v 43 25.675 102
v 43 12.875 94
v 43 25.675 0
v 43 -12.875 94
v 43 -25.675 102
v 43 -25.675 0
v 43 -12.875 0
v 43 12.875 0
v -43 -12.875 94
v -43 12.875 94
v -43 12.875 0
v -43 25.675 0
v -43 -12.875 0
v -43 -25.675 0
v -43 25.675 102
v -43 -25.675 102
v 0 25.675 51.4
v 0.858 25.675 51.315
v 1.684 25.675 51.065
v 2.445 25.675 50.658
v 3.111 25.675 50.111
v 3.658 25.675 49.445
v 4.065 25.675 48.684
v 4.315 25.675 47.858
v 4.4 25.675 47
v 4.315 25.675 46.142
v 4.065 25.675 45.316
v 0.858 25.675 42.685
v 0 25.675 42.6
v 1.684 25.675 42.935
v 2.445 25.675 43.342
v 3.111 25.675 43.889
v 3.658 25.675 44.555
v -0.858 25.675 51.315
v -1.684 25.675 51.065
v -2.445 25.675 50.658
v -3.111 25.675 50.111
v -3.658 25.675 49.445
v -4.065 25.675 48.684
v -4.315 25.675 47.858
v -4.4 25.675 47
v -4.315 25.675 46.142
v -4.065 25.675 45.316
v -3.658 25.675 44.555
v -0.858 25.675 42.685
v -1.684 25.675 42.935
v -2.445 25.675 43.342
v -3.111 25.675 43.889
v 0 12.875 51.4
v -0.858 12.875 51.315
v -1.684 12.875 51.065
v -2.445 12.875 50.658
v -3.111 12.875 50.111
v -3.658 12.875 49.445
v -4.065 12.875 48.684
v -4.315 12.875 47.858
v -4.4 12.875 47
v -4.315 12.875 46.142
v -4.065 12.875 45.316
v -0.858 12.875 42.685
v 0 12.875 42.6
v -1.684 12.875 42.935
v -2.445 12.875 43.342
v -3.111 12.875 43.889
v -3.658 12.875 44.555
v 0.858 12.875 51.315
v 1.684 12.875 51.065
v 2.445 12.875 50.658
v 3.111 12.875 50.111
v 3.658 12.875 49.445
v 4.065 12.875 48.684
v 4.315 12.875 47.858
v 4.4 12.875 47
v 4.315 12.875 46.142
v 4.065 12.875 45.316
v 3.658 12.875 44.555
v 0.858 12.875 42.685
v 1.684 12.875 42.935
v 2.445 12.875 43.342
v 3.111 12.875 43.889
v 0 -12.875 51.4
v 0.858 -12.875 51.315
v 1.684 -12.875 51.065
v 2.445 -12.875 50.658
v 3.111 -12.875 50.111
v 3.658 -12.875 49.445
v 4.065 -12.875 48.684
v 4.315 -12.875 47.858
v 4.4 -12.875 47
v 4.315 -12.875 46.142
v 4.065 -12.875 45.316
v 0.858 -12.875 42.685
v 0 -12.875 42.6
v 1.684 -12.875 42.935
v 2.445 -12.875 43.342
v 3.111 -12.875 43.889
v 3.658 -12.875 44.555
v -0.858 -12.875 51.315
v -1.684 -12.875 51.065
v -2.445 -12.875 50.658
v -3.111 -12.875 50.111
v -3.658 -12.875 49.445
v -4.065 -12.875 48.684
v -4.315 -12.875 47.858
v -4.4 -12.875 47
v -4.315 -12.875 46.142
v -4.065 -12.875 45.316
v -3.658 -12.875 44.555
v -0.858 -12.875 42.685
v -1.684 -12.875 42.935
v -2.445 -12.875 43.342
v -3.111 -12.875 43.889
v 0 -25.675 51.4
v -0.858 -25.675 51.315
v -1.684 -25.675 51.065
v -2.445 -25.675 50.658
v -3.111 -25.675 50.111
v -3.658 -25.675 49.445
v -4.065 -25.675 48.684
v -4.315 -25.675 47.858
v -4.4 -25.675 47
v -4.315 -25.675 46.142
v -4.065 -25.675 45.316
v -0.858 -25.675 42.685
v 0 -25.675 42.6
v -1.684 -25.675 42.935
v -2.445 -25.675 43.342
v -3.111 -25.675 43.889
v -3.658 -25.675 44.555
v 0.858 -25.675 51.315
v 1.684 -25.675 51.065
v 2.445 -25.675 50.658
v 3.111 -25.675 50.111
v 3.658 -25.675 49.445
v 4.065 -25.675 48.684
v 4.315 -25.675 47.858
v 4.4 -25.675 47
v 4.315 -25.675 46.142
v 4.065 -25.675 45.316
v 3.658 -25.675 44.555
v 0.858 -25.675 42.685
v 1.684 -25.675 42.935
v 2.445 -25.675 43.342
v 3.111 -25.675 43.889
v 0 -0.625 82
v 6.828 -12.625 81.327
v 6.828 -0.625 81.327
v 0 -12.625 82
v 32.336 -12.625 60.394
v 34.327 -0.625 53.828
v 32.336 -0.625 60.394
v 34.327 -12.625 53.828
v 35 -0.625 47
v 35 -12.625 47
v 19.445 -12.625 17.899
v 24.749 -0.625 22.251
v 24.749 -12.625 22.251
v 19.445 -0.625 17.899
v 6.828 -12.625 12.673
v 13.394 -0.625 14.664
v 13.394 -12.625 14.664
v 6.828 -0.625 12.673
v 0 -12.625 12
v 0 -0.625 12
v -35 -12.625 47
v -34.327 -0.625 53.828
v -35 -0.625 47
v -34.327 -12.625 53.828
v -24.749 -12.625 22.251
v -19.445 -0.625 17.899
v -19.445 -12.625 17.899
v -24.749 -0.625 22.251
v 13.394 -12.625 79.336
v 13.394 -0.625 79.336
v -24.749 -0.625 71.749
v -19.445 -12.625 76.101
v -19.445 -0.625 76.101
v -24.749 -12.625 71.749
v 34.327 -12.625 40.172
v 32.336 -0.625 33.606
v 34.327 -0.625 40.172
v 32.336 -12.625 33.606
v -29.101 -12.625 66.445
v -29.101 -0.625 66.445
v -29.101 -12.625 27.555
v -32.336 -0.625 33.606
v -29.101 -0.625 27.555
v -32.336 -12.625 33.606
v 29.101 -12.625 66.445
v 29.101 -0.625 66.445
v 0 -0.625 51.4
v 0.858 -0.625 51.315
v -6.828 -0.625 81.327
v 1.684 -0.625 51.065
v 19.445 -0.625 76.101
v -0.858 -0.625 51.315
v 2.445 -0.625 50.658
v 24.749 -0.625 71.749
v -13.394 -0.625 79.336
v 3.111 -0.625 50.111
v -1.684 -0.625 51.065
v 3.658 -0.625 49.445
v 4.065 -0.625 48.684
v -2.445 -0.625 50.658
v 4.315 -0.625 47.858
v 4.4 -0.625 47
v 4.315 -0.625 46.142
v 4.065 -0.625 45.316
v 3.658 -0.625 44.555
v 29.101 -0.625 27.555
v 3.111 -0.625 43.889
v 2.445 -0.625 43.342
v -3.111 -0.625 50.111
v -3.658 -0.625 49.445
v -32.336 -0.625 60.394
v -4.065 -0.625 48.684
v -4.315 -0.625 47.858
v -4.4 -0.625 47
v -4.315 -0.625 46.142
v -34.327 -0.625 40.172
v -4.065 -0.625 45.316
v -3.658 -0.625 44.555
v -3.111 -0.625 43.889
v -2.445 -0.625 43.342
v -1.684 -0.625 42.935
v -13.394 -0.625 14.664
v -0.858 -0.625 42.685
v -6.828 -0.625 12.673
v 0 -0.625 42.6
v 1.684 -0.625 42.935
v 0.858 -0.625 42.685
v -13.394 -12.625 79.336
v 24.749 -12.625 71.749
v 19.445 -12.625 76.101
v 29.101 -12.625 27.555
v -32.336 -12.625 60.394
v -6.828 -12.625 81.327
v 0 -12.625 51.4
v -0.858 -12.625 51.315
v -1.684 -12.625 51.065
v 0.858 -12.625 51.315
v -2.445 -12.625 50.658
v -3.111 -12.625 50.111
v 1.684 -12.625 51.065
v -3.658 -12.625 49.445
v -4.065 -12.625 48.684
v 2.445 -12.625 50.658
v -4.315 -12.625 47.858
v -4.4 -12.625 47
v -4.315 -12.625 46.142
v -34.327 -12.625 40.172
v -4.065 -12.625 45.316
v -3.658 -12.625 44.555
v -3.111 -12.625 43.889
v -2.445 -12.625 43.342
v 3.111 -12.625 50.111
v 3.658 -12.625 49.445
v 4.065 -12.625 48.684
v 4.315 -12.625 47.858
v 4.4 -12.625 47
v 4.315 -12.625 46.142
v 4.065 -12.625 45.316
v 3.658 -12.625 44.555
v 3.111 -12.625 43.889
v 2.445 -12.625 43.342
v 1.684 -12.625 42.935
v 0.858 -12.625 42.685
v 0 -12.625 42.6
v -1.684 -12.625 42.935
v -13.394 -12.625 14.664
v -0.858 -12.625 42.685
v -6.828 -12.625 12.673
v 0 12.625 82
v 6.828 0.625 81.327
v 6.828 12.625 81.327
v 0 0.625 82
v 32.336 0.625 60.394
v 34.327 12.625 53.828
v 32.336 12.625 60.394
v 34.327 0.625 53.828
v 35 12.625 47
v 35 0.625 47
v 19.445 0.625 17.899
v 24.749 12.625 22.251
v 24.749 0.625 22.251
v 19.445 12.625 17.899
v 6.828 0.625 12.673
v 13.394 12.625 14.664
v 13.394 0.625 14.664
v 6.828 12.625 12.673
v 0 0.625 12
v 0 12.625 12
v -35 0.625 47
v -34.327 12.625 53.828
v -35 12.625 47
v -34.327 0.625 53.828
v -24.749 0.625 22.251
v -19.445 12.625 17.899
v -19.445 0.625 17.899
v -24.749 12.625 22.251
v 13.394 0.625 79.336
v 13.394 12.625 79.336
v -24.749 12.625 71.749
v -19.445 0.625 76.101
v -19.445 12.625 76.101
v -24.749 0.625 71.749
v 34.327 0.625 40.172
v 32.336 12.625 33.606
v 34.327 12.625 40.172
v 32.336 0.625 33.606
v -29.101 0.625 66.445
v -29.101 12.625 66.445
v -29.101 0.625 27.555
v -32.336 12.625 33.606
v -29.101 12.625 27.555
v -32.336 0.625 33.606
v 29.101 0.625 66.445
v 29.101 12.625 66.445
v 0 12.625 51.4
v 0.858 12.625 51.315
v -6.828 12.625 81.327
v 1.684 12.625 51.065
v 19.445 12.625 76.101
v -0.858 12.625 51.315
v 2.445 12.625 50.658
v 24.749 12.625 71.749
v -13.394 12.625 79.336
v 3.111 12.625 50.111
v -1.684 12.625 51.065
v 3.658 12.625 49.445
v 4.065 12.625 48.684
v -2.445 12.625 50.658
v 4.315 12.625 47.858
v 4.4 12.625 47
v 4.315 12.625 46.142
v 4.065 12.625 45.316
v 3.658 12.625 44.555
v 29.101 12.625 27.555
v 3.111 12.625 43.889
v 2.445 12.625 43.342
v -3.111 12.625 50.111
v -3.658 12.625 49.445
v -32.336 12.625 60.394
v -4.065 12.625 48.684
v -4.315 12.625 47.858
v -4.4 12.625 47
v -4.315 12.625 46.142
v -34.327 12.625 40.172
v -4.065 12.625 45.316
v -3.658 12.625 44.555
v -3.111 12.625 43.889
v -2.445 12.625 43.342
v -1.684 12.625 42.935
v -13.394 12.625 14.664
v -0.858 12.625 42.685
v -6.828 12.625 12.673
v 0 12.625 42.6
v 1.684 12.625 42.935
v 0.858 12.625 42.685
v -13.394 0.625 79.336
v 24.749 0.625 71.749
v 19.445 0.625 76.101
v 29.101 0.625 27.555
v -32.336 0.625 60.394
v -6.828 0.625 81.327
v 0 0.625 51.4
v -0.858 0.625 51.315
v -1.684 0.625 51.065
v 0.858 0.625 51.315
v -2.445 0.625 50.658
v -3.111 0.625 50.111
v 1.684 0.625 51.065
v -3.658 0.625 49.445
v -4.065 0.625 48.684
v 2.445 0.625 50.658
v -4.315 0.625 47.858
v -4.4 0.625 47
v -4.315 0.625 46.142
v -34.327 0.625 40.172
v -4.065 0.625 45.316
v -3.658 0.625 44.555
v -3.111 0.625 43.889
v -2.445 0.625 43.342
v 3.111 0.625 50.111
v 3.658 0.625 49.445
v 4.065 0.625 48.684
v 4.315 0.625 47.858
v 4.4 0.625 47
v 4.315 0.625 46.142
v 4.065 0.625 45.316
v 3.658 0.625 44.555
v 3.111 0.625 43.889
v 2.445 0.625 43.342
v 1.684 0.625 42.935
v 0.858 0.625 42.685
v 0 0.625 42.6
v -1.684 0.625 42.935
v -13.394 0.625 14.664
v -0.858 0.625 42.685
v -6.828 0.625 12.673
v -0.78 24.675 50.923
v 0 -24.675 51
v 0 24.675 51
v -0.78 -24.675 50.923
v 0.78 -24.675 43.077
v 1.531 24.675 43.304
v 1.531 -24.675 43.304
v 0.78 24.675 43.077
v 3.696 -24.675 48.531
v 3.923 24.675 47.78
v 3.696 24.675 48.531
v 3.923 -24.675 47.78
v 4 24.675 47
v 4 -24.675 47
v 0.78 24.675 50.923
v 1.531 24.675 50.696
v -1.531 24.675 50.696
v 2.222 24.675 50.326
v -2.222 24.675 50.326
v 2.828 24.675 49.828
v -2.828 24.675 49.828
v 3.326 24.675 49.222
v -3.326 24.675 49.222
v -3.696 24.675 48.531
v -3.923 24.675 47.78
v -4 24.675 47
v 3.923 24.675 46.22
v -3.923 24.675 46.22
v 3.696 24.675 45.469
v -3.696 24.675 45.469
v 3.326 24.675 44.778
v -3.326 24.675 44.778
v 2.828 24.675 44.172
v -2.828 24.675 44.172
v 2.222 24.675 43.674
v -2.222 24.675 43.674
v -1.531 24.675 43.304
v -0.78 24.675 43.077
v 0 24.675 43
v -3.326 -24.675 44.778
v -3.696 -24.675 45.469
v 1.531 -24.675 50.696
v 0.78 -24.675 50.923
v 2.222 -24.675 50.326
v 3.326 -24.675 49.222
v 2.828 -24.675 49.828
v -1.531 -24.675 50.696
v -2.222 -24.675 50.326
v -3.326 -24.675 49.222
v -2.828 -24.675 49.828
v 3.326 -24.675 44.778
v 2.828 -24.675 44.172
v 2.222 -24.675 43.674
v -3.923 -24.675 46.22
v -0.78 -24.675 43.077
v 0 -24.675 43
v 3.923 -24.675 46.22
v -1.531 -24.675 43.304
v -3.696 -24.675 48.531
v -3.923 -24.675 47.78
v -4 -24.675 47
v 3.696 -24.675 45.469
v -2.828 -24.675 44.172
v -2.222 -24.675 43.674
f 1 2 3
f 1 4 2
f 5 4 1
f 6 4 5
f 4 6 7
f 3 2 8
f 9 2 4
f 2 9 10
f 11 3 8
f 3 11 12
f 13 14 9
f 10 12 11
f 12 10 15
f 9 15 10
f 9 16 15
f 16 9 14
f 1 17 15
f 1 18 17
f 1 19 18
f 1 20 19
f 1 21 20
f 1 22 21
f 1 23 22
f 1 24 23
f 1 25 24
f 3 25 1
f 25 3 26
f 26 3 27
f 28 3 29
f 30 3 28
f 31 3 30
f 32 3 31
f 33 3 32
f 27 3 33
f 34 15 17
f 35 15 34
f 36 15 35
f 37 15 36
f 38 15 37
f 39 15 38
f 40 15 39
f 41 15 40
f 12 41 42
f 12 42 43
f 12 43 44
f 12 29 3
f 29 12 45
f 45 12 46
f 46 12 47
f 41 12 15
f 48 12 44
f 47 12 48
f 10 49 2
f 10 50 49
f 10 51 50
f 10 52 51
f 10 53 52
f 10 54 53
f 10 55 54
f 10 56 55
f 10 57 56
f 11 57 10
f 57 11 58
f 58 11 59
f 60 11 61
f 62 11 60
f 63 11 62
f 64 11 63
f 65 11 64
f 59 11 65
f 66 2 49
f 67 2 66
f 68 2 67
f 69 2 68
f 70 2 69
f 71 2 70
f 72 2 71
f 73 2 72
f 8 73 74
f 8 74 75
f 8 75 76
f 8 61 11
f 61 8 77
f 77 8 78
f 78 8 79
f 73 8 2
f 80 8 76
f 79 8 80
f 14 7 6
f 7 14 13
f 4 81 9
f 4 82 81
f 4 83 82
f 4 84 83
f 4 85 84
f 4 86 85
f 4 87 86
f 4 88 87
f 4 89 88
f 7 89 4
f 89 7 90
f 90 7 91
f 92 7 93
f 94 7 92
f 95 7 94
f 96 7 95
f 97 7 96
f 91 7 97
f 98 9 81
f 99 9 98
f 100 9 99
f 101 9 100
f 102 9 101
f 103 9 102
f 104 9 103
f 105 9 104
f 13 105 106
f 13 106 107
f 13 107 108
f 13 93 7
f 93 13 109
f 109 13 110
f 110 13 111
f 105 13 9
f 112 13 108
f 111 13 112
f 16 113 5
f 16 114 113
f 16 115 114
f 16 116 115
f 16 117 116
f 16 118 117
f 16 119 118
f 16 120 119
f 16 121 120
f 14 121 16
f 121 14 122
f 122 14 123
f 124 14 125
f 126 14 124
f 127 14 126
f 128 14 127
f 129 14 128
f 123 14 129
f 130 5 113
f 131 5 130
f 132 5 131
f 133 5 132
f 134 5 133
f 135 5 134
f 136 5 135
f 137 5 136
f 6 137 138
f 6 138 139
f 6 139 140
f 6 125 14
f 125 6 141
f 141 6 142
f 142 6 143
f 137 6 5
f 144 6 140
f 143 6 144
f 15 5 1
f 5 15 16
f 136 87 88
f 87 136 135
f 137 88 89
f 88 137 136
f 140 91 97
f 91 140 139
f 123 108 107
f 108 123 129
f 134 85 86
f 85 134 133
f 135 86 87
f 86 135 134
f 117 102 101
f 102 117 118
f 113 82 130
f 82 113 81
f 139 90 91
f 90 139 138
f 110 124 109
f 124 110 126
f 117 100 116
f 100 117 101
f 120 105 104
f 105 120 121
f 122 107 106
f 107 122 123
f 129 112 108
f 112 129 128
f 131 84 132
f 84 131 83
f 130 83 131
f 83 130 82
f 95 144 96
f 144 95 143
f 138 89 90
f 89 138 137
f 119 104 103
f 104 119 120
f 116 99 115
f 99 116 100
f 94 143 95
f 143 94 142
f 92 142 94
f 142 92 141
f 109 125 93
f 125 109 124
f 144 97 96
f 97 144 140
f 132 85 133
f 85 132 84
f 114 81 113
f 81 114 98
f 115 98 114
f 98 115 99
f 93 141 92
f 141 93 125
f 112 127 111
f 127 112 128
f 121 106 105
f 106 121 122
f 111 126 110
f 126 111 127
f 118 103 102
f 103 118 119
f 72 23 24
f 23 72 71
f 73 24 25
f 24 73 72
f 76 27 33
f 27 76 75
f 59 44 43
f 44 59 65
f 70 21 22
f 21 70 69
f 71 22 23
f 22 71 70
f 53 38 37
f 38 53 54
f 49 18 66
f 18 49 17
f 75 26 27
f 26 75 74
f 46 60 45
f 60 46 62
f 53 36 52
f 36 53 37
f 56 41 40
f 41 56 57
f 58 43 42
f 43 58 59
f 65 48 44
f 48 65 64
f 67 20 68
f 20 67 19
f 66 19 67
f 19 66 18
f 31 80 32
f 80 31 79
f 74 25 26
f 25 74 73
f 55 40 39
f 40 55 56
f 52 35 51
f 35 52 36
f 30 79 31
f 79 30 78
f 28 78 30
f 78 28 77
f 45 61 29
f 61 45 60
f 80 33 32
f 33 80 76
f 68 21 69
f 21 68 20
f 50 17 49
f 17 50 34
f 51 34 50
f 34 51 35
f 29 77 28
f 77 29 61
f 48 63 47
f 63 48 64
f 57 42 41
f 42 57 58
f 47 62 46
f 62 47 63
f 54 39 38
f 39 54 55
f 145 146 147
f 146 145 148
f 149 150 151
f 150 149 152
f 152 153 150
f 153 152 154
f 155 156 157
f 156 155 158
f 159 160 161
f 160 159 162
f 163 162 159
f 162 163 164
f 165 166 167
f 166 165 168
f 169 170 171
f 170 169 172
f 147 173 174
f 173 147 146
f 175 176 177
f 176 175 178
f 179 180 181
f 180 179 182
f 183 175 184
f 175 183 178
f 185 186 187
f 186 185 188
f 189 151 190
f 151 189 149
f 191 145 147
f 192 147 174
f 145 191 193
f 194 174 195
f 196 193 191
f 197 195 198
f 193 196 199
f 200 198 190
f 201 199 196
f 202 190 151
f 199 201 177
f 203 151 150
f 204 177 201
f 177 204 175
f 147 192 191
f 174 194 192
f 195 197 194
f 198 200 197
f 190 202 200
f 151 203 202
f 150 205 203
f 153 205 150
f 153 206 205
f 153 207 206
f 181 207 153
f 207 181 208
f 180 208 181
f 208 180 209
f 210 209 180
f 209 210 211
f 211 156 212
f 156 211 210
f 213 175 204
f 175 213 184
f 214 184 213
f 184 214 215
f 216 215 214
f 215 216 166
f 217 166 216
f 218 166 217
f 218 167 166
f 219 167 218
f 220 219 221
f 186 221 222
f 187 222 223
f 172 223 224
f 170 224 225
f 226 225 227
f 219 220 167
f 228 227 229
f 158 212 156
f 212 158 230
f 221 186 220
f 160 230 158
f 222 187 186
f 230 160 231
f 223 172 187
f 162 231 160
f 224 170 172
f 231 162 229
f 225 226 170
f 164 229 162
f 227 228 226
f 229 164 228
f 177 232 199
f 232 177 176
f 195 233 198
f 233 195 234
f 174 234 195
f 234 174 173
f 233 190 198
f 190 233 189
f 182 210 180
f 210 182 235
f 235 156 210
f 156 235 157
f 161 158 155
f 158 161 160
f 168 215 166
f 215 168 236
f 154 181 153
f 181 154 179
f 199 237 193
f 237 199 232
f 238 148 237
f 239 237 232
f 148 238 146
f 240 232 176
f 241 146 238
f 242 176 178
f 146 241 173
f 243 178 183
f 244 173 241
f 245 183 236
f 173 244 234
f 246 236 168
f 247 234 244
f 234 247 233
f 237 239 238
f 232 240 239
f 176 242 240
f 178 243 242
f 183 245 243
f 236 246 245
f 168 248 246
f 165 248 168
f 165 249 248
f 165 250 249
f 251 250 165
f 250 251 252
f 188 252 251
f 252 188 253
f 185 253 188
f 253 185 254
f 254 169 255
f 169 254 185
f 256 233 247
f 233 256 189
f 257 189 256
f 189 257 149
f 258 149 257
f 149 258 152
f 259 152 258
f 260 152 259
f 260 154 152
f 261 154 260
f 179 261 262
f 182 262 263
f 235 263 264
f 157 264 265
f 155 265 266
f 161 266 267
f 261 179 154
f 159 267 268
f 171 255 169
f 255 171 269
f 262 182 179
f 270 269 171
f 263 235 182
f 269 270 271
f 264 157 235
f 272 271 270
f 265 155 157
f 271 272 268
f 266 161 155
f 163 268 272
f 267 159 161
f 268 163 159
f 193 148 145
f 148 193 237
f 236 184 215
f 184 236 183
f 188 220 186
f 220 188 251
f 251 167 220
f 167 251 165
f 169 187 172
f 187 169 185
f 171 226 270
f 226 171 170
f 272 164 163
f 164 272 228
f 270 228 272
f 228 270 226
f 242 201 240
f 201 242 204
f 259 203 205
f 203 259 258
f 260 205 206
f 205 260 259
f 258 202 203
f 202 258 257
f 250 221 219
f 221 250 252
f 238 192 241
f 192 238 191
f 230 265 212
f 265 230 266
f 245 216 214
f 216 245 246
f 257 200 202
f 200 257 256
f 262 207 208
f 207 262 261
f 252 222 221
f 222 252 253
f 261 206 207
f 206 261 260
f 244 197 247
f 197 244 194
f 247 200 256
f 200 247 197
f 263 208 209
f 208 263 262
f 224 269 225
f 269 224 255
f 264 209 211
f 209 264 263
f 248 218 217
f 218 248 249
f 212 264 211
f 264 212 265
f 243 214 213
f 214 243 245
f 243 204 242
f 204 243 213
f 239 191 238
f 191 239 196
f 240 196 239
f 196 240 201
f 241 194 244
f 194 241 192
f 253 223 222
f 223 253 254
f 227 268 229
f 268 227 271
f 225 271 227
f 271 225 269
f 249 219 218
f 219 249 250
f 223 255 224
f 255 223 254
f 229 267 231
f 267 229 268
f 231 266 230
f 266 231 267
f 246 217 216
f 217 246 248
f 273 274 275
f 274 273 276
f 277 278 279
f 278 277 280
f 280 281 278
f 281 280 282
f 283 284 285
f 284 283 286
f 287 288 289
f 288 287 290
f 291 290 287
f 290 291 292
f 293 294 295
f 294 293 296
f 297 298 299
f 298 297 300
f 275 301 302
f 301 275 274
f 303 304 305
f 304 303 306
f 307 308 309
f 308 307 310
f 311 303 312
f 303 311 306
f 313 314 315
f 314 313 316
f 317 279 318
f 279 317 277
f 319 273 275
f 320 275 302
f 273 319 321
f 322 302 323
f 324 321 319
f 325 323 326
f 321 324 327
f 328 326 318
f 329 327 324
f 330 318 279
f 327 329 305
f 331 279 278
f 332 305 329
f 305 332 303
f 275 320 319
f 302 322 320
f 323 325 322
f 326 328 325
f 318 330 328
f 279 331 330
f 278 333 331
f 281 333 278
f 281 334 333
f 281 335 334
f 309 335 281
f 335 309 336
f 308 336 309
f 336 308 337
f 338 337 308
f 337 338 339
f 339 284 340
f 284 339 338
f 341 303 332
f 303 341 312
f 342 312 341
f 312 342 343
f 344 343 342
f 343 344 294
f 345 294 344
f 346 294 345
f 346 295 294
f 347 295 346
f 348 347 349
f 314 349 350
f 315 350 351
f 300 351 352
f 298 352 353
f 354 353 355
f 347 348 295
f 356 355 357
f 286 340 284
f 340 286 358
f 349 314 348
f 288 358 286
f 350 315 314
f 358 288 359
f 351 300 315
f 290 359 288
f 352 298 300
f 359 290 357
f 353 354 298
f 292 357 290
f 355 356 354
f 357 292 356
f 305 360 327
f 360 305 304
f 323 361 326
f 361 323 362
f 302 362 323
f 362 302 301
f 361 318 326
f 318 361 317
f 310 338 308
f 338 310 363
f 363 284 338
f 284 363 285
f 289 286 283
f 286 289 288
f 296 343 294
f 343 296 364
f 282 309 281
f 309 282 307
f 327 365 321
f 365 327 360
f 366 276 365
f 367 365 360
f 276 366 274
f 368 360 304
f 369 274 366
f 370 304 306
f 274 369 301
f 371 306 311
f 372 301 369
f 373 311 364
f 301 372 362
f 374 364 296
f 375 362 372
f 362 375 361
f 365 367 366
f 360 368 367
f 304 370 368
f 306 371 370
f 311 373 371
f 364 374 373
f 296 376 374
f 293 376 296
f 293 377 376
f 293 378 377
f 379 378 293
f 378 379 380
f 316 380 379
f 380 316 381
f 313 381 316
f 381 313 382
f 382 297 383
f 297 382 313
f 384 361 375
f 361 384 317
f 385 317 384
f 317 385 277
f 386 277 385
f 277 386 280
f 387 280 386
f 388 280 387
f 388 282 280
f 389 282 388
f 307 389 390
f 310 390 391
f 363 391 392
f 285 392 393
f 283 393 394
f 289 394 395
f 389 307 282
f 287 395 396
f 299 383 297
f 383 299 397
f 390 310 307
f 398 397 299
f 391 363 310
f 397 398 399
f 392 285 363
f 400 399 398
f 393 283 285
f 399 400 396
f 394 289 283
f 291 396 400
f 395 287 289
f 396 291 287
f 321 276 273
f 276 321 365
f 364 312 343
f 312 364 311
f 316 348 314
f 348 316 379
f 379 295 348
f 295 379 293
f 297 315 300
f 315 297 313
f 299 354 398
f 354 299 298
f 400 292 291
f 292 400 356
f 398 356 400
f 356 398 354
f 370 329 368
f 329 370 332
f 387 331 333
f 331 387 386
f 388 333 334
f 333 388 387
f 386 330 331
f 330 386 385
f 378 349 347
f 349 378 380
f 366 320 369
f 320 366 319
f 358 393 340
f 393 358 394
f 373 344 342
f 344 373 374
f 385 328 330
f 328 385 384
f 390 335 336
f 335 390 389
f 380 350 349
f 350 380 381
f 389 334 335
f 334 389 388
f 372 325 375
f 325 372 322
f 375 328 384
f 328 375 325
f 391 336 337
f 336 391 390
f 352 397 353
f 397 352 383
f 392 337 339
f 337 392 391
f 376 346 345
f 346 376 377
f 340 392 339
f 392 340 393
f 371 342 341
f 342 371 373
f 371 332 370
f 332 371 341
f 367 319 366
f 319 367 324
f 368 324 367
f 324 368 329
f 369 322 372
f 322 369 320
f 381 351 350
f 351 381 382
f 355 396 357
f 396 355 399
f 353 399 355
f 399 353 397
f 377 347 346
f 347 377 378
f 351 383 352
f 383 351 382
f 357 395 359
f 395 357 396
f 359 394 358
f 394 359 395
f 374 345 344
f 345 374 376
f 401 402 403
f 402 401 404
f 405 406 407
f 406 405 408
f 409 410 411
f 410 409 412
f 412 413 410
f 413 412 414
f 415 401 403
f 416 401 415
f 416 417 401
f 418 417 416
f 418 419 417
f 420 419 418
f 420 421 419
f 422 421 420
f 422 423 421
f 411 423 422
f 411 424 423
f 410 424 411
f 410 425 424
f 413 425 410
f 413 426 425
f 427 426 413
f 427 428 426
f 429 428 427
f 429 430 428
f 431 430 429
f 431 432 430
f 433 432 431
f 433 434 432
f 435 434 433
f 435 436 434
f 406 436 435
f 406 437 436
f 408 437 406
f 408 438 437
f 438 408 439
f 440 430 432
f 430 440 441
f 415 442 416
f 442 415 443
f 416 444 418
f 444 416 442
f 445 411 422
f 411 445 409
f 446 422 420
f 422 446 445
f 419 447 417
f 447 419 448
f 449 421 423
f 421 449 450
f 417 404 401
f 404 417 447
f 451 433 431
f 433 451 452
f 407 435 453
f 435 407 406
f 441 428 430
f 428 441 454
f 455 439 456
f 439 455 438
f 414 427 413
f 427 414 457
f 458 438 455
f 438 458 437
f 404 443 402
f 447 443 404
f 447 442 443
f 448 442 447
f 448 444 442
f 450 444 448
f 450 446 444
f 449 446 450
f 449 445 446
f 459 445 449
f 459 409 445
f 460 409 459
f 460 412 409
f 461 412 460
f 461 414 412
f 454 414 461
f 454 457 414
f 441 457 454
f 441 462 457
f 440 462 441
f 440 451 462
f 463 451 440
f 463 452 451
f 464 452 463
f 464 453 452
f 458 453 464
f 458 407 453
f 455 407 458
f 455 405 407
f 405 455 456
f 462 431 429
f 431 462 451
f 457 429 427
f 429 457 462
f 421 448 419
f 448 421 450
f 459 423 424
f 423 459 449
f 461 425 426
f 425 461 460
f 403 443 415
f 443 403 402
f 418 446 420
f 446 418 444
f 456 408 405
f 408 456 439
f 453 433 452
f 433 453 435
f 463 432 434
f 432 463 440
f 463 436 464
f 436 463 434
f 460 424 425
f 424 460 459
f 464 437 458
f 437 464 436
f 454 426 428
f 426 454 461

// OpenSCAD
$fn = 32;

// ------------------------------------------------------------------------
// Trolley wheel set: wheels d70, fork 94 mm tall
// Every part is its own module, assembly() places every instance.
// ------------------------------------------------------------------------

// --- part 1 ---
module trolley_fork() {
  difference() {
    union() {
      translate([-43, 12.875, 0]) cube([86, 12.8, 94]);
      translate([-43, -25.675, 0]) cube([86, 12.8, 94]);
      translate([-43, -25.675, 94]) cube([86, 51.35, 8]);
    }
    translate([0, -19.275, 47]) rotate([90, 0, 0]) cylinder(h = 14.8, d = 8.8, center = true);
    translate([0, 19.275, 47]) rotate([90, 0, 0]) cylinder(h = 14.8, d = 8.8, center = true);
  }
}

// --- part 2 ---
module trolley_wheel() {
  difference() {
      translate([0, 0, 0]) cylinder(h = 12, d = 70);
      translate([0, 0, -1]) cylinder(h = 14, d = 8.8);
    }
}

// --- part 3 ---
module trolley_axle() {
  translate([0, 0, -24.675]) cylinder(h = 49.35, d = 8);
}

// --- assembly ---
module assembly() {
  color([0.80, 0.24, 0.20]) translate([0, 0, 0]) rotate([0, 0, 0]) trolley_fork();
  color([0.20, 0.45, 0.75]) translate([0, -0.625, 47]) rotate([90, 0, 0]) trolley_wheel();
  color([0.25, 0.62, 0.32]) translate([0, 12.625, 47]) rotate([90, 0, 0]) trolley_wheel();
  color([0.92, 0.70, 0.18]) translate([0, 0, 47]) rotate([90, 0, 0]) trolley_axle();
}

assembly();
